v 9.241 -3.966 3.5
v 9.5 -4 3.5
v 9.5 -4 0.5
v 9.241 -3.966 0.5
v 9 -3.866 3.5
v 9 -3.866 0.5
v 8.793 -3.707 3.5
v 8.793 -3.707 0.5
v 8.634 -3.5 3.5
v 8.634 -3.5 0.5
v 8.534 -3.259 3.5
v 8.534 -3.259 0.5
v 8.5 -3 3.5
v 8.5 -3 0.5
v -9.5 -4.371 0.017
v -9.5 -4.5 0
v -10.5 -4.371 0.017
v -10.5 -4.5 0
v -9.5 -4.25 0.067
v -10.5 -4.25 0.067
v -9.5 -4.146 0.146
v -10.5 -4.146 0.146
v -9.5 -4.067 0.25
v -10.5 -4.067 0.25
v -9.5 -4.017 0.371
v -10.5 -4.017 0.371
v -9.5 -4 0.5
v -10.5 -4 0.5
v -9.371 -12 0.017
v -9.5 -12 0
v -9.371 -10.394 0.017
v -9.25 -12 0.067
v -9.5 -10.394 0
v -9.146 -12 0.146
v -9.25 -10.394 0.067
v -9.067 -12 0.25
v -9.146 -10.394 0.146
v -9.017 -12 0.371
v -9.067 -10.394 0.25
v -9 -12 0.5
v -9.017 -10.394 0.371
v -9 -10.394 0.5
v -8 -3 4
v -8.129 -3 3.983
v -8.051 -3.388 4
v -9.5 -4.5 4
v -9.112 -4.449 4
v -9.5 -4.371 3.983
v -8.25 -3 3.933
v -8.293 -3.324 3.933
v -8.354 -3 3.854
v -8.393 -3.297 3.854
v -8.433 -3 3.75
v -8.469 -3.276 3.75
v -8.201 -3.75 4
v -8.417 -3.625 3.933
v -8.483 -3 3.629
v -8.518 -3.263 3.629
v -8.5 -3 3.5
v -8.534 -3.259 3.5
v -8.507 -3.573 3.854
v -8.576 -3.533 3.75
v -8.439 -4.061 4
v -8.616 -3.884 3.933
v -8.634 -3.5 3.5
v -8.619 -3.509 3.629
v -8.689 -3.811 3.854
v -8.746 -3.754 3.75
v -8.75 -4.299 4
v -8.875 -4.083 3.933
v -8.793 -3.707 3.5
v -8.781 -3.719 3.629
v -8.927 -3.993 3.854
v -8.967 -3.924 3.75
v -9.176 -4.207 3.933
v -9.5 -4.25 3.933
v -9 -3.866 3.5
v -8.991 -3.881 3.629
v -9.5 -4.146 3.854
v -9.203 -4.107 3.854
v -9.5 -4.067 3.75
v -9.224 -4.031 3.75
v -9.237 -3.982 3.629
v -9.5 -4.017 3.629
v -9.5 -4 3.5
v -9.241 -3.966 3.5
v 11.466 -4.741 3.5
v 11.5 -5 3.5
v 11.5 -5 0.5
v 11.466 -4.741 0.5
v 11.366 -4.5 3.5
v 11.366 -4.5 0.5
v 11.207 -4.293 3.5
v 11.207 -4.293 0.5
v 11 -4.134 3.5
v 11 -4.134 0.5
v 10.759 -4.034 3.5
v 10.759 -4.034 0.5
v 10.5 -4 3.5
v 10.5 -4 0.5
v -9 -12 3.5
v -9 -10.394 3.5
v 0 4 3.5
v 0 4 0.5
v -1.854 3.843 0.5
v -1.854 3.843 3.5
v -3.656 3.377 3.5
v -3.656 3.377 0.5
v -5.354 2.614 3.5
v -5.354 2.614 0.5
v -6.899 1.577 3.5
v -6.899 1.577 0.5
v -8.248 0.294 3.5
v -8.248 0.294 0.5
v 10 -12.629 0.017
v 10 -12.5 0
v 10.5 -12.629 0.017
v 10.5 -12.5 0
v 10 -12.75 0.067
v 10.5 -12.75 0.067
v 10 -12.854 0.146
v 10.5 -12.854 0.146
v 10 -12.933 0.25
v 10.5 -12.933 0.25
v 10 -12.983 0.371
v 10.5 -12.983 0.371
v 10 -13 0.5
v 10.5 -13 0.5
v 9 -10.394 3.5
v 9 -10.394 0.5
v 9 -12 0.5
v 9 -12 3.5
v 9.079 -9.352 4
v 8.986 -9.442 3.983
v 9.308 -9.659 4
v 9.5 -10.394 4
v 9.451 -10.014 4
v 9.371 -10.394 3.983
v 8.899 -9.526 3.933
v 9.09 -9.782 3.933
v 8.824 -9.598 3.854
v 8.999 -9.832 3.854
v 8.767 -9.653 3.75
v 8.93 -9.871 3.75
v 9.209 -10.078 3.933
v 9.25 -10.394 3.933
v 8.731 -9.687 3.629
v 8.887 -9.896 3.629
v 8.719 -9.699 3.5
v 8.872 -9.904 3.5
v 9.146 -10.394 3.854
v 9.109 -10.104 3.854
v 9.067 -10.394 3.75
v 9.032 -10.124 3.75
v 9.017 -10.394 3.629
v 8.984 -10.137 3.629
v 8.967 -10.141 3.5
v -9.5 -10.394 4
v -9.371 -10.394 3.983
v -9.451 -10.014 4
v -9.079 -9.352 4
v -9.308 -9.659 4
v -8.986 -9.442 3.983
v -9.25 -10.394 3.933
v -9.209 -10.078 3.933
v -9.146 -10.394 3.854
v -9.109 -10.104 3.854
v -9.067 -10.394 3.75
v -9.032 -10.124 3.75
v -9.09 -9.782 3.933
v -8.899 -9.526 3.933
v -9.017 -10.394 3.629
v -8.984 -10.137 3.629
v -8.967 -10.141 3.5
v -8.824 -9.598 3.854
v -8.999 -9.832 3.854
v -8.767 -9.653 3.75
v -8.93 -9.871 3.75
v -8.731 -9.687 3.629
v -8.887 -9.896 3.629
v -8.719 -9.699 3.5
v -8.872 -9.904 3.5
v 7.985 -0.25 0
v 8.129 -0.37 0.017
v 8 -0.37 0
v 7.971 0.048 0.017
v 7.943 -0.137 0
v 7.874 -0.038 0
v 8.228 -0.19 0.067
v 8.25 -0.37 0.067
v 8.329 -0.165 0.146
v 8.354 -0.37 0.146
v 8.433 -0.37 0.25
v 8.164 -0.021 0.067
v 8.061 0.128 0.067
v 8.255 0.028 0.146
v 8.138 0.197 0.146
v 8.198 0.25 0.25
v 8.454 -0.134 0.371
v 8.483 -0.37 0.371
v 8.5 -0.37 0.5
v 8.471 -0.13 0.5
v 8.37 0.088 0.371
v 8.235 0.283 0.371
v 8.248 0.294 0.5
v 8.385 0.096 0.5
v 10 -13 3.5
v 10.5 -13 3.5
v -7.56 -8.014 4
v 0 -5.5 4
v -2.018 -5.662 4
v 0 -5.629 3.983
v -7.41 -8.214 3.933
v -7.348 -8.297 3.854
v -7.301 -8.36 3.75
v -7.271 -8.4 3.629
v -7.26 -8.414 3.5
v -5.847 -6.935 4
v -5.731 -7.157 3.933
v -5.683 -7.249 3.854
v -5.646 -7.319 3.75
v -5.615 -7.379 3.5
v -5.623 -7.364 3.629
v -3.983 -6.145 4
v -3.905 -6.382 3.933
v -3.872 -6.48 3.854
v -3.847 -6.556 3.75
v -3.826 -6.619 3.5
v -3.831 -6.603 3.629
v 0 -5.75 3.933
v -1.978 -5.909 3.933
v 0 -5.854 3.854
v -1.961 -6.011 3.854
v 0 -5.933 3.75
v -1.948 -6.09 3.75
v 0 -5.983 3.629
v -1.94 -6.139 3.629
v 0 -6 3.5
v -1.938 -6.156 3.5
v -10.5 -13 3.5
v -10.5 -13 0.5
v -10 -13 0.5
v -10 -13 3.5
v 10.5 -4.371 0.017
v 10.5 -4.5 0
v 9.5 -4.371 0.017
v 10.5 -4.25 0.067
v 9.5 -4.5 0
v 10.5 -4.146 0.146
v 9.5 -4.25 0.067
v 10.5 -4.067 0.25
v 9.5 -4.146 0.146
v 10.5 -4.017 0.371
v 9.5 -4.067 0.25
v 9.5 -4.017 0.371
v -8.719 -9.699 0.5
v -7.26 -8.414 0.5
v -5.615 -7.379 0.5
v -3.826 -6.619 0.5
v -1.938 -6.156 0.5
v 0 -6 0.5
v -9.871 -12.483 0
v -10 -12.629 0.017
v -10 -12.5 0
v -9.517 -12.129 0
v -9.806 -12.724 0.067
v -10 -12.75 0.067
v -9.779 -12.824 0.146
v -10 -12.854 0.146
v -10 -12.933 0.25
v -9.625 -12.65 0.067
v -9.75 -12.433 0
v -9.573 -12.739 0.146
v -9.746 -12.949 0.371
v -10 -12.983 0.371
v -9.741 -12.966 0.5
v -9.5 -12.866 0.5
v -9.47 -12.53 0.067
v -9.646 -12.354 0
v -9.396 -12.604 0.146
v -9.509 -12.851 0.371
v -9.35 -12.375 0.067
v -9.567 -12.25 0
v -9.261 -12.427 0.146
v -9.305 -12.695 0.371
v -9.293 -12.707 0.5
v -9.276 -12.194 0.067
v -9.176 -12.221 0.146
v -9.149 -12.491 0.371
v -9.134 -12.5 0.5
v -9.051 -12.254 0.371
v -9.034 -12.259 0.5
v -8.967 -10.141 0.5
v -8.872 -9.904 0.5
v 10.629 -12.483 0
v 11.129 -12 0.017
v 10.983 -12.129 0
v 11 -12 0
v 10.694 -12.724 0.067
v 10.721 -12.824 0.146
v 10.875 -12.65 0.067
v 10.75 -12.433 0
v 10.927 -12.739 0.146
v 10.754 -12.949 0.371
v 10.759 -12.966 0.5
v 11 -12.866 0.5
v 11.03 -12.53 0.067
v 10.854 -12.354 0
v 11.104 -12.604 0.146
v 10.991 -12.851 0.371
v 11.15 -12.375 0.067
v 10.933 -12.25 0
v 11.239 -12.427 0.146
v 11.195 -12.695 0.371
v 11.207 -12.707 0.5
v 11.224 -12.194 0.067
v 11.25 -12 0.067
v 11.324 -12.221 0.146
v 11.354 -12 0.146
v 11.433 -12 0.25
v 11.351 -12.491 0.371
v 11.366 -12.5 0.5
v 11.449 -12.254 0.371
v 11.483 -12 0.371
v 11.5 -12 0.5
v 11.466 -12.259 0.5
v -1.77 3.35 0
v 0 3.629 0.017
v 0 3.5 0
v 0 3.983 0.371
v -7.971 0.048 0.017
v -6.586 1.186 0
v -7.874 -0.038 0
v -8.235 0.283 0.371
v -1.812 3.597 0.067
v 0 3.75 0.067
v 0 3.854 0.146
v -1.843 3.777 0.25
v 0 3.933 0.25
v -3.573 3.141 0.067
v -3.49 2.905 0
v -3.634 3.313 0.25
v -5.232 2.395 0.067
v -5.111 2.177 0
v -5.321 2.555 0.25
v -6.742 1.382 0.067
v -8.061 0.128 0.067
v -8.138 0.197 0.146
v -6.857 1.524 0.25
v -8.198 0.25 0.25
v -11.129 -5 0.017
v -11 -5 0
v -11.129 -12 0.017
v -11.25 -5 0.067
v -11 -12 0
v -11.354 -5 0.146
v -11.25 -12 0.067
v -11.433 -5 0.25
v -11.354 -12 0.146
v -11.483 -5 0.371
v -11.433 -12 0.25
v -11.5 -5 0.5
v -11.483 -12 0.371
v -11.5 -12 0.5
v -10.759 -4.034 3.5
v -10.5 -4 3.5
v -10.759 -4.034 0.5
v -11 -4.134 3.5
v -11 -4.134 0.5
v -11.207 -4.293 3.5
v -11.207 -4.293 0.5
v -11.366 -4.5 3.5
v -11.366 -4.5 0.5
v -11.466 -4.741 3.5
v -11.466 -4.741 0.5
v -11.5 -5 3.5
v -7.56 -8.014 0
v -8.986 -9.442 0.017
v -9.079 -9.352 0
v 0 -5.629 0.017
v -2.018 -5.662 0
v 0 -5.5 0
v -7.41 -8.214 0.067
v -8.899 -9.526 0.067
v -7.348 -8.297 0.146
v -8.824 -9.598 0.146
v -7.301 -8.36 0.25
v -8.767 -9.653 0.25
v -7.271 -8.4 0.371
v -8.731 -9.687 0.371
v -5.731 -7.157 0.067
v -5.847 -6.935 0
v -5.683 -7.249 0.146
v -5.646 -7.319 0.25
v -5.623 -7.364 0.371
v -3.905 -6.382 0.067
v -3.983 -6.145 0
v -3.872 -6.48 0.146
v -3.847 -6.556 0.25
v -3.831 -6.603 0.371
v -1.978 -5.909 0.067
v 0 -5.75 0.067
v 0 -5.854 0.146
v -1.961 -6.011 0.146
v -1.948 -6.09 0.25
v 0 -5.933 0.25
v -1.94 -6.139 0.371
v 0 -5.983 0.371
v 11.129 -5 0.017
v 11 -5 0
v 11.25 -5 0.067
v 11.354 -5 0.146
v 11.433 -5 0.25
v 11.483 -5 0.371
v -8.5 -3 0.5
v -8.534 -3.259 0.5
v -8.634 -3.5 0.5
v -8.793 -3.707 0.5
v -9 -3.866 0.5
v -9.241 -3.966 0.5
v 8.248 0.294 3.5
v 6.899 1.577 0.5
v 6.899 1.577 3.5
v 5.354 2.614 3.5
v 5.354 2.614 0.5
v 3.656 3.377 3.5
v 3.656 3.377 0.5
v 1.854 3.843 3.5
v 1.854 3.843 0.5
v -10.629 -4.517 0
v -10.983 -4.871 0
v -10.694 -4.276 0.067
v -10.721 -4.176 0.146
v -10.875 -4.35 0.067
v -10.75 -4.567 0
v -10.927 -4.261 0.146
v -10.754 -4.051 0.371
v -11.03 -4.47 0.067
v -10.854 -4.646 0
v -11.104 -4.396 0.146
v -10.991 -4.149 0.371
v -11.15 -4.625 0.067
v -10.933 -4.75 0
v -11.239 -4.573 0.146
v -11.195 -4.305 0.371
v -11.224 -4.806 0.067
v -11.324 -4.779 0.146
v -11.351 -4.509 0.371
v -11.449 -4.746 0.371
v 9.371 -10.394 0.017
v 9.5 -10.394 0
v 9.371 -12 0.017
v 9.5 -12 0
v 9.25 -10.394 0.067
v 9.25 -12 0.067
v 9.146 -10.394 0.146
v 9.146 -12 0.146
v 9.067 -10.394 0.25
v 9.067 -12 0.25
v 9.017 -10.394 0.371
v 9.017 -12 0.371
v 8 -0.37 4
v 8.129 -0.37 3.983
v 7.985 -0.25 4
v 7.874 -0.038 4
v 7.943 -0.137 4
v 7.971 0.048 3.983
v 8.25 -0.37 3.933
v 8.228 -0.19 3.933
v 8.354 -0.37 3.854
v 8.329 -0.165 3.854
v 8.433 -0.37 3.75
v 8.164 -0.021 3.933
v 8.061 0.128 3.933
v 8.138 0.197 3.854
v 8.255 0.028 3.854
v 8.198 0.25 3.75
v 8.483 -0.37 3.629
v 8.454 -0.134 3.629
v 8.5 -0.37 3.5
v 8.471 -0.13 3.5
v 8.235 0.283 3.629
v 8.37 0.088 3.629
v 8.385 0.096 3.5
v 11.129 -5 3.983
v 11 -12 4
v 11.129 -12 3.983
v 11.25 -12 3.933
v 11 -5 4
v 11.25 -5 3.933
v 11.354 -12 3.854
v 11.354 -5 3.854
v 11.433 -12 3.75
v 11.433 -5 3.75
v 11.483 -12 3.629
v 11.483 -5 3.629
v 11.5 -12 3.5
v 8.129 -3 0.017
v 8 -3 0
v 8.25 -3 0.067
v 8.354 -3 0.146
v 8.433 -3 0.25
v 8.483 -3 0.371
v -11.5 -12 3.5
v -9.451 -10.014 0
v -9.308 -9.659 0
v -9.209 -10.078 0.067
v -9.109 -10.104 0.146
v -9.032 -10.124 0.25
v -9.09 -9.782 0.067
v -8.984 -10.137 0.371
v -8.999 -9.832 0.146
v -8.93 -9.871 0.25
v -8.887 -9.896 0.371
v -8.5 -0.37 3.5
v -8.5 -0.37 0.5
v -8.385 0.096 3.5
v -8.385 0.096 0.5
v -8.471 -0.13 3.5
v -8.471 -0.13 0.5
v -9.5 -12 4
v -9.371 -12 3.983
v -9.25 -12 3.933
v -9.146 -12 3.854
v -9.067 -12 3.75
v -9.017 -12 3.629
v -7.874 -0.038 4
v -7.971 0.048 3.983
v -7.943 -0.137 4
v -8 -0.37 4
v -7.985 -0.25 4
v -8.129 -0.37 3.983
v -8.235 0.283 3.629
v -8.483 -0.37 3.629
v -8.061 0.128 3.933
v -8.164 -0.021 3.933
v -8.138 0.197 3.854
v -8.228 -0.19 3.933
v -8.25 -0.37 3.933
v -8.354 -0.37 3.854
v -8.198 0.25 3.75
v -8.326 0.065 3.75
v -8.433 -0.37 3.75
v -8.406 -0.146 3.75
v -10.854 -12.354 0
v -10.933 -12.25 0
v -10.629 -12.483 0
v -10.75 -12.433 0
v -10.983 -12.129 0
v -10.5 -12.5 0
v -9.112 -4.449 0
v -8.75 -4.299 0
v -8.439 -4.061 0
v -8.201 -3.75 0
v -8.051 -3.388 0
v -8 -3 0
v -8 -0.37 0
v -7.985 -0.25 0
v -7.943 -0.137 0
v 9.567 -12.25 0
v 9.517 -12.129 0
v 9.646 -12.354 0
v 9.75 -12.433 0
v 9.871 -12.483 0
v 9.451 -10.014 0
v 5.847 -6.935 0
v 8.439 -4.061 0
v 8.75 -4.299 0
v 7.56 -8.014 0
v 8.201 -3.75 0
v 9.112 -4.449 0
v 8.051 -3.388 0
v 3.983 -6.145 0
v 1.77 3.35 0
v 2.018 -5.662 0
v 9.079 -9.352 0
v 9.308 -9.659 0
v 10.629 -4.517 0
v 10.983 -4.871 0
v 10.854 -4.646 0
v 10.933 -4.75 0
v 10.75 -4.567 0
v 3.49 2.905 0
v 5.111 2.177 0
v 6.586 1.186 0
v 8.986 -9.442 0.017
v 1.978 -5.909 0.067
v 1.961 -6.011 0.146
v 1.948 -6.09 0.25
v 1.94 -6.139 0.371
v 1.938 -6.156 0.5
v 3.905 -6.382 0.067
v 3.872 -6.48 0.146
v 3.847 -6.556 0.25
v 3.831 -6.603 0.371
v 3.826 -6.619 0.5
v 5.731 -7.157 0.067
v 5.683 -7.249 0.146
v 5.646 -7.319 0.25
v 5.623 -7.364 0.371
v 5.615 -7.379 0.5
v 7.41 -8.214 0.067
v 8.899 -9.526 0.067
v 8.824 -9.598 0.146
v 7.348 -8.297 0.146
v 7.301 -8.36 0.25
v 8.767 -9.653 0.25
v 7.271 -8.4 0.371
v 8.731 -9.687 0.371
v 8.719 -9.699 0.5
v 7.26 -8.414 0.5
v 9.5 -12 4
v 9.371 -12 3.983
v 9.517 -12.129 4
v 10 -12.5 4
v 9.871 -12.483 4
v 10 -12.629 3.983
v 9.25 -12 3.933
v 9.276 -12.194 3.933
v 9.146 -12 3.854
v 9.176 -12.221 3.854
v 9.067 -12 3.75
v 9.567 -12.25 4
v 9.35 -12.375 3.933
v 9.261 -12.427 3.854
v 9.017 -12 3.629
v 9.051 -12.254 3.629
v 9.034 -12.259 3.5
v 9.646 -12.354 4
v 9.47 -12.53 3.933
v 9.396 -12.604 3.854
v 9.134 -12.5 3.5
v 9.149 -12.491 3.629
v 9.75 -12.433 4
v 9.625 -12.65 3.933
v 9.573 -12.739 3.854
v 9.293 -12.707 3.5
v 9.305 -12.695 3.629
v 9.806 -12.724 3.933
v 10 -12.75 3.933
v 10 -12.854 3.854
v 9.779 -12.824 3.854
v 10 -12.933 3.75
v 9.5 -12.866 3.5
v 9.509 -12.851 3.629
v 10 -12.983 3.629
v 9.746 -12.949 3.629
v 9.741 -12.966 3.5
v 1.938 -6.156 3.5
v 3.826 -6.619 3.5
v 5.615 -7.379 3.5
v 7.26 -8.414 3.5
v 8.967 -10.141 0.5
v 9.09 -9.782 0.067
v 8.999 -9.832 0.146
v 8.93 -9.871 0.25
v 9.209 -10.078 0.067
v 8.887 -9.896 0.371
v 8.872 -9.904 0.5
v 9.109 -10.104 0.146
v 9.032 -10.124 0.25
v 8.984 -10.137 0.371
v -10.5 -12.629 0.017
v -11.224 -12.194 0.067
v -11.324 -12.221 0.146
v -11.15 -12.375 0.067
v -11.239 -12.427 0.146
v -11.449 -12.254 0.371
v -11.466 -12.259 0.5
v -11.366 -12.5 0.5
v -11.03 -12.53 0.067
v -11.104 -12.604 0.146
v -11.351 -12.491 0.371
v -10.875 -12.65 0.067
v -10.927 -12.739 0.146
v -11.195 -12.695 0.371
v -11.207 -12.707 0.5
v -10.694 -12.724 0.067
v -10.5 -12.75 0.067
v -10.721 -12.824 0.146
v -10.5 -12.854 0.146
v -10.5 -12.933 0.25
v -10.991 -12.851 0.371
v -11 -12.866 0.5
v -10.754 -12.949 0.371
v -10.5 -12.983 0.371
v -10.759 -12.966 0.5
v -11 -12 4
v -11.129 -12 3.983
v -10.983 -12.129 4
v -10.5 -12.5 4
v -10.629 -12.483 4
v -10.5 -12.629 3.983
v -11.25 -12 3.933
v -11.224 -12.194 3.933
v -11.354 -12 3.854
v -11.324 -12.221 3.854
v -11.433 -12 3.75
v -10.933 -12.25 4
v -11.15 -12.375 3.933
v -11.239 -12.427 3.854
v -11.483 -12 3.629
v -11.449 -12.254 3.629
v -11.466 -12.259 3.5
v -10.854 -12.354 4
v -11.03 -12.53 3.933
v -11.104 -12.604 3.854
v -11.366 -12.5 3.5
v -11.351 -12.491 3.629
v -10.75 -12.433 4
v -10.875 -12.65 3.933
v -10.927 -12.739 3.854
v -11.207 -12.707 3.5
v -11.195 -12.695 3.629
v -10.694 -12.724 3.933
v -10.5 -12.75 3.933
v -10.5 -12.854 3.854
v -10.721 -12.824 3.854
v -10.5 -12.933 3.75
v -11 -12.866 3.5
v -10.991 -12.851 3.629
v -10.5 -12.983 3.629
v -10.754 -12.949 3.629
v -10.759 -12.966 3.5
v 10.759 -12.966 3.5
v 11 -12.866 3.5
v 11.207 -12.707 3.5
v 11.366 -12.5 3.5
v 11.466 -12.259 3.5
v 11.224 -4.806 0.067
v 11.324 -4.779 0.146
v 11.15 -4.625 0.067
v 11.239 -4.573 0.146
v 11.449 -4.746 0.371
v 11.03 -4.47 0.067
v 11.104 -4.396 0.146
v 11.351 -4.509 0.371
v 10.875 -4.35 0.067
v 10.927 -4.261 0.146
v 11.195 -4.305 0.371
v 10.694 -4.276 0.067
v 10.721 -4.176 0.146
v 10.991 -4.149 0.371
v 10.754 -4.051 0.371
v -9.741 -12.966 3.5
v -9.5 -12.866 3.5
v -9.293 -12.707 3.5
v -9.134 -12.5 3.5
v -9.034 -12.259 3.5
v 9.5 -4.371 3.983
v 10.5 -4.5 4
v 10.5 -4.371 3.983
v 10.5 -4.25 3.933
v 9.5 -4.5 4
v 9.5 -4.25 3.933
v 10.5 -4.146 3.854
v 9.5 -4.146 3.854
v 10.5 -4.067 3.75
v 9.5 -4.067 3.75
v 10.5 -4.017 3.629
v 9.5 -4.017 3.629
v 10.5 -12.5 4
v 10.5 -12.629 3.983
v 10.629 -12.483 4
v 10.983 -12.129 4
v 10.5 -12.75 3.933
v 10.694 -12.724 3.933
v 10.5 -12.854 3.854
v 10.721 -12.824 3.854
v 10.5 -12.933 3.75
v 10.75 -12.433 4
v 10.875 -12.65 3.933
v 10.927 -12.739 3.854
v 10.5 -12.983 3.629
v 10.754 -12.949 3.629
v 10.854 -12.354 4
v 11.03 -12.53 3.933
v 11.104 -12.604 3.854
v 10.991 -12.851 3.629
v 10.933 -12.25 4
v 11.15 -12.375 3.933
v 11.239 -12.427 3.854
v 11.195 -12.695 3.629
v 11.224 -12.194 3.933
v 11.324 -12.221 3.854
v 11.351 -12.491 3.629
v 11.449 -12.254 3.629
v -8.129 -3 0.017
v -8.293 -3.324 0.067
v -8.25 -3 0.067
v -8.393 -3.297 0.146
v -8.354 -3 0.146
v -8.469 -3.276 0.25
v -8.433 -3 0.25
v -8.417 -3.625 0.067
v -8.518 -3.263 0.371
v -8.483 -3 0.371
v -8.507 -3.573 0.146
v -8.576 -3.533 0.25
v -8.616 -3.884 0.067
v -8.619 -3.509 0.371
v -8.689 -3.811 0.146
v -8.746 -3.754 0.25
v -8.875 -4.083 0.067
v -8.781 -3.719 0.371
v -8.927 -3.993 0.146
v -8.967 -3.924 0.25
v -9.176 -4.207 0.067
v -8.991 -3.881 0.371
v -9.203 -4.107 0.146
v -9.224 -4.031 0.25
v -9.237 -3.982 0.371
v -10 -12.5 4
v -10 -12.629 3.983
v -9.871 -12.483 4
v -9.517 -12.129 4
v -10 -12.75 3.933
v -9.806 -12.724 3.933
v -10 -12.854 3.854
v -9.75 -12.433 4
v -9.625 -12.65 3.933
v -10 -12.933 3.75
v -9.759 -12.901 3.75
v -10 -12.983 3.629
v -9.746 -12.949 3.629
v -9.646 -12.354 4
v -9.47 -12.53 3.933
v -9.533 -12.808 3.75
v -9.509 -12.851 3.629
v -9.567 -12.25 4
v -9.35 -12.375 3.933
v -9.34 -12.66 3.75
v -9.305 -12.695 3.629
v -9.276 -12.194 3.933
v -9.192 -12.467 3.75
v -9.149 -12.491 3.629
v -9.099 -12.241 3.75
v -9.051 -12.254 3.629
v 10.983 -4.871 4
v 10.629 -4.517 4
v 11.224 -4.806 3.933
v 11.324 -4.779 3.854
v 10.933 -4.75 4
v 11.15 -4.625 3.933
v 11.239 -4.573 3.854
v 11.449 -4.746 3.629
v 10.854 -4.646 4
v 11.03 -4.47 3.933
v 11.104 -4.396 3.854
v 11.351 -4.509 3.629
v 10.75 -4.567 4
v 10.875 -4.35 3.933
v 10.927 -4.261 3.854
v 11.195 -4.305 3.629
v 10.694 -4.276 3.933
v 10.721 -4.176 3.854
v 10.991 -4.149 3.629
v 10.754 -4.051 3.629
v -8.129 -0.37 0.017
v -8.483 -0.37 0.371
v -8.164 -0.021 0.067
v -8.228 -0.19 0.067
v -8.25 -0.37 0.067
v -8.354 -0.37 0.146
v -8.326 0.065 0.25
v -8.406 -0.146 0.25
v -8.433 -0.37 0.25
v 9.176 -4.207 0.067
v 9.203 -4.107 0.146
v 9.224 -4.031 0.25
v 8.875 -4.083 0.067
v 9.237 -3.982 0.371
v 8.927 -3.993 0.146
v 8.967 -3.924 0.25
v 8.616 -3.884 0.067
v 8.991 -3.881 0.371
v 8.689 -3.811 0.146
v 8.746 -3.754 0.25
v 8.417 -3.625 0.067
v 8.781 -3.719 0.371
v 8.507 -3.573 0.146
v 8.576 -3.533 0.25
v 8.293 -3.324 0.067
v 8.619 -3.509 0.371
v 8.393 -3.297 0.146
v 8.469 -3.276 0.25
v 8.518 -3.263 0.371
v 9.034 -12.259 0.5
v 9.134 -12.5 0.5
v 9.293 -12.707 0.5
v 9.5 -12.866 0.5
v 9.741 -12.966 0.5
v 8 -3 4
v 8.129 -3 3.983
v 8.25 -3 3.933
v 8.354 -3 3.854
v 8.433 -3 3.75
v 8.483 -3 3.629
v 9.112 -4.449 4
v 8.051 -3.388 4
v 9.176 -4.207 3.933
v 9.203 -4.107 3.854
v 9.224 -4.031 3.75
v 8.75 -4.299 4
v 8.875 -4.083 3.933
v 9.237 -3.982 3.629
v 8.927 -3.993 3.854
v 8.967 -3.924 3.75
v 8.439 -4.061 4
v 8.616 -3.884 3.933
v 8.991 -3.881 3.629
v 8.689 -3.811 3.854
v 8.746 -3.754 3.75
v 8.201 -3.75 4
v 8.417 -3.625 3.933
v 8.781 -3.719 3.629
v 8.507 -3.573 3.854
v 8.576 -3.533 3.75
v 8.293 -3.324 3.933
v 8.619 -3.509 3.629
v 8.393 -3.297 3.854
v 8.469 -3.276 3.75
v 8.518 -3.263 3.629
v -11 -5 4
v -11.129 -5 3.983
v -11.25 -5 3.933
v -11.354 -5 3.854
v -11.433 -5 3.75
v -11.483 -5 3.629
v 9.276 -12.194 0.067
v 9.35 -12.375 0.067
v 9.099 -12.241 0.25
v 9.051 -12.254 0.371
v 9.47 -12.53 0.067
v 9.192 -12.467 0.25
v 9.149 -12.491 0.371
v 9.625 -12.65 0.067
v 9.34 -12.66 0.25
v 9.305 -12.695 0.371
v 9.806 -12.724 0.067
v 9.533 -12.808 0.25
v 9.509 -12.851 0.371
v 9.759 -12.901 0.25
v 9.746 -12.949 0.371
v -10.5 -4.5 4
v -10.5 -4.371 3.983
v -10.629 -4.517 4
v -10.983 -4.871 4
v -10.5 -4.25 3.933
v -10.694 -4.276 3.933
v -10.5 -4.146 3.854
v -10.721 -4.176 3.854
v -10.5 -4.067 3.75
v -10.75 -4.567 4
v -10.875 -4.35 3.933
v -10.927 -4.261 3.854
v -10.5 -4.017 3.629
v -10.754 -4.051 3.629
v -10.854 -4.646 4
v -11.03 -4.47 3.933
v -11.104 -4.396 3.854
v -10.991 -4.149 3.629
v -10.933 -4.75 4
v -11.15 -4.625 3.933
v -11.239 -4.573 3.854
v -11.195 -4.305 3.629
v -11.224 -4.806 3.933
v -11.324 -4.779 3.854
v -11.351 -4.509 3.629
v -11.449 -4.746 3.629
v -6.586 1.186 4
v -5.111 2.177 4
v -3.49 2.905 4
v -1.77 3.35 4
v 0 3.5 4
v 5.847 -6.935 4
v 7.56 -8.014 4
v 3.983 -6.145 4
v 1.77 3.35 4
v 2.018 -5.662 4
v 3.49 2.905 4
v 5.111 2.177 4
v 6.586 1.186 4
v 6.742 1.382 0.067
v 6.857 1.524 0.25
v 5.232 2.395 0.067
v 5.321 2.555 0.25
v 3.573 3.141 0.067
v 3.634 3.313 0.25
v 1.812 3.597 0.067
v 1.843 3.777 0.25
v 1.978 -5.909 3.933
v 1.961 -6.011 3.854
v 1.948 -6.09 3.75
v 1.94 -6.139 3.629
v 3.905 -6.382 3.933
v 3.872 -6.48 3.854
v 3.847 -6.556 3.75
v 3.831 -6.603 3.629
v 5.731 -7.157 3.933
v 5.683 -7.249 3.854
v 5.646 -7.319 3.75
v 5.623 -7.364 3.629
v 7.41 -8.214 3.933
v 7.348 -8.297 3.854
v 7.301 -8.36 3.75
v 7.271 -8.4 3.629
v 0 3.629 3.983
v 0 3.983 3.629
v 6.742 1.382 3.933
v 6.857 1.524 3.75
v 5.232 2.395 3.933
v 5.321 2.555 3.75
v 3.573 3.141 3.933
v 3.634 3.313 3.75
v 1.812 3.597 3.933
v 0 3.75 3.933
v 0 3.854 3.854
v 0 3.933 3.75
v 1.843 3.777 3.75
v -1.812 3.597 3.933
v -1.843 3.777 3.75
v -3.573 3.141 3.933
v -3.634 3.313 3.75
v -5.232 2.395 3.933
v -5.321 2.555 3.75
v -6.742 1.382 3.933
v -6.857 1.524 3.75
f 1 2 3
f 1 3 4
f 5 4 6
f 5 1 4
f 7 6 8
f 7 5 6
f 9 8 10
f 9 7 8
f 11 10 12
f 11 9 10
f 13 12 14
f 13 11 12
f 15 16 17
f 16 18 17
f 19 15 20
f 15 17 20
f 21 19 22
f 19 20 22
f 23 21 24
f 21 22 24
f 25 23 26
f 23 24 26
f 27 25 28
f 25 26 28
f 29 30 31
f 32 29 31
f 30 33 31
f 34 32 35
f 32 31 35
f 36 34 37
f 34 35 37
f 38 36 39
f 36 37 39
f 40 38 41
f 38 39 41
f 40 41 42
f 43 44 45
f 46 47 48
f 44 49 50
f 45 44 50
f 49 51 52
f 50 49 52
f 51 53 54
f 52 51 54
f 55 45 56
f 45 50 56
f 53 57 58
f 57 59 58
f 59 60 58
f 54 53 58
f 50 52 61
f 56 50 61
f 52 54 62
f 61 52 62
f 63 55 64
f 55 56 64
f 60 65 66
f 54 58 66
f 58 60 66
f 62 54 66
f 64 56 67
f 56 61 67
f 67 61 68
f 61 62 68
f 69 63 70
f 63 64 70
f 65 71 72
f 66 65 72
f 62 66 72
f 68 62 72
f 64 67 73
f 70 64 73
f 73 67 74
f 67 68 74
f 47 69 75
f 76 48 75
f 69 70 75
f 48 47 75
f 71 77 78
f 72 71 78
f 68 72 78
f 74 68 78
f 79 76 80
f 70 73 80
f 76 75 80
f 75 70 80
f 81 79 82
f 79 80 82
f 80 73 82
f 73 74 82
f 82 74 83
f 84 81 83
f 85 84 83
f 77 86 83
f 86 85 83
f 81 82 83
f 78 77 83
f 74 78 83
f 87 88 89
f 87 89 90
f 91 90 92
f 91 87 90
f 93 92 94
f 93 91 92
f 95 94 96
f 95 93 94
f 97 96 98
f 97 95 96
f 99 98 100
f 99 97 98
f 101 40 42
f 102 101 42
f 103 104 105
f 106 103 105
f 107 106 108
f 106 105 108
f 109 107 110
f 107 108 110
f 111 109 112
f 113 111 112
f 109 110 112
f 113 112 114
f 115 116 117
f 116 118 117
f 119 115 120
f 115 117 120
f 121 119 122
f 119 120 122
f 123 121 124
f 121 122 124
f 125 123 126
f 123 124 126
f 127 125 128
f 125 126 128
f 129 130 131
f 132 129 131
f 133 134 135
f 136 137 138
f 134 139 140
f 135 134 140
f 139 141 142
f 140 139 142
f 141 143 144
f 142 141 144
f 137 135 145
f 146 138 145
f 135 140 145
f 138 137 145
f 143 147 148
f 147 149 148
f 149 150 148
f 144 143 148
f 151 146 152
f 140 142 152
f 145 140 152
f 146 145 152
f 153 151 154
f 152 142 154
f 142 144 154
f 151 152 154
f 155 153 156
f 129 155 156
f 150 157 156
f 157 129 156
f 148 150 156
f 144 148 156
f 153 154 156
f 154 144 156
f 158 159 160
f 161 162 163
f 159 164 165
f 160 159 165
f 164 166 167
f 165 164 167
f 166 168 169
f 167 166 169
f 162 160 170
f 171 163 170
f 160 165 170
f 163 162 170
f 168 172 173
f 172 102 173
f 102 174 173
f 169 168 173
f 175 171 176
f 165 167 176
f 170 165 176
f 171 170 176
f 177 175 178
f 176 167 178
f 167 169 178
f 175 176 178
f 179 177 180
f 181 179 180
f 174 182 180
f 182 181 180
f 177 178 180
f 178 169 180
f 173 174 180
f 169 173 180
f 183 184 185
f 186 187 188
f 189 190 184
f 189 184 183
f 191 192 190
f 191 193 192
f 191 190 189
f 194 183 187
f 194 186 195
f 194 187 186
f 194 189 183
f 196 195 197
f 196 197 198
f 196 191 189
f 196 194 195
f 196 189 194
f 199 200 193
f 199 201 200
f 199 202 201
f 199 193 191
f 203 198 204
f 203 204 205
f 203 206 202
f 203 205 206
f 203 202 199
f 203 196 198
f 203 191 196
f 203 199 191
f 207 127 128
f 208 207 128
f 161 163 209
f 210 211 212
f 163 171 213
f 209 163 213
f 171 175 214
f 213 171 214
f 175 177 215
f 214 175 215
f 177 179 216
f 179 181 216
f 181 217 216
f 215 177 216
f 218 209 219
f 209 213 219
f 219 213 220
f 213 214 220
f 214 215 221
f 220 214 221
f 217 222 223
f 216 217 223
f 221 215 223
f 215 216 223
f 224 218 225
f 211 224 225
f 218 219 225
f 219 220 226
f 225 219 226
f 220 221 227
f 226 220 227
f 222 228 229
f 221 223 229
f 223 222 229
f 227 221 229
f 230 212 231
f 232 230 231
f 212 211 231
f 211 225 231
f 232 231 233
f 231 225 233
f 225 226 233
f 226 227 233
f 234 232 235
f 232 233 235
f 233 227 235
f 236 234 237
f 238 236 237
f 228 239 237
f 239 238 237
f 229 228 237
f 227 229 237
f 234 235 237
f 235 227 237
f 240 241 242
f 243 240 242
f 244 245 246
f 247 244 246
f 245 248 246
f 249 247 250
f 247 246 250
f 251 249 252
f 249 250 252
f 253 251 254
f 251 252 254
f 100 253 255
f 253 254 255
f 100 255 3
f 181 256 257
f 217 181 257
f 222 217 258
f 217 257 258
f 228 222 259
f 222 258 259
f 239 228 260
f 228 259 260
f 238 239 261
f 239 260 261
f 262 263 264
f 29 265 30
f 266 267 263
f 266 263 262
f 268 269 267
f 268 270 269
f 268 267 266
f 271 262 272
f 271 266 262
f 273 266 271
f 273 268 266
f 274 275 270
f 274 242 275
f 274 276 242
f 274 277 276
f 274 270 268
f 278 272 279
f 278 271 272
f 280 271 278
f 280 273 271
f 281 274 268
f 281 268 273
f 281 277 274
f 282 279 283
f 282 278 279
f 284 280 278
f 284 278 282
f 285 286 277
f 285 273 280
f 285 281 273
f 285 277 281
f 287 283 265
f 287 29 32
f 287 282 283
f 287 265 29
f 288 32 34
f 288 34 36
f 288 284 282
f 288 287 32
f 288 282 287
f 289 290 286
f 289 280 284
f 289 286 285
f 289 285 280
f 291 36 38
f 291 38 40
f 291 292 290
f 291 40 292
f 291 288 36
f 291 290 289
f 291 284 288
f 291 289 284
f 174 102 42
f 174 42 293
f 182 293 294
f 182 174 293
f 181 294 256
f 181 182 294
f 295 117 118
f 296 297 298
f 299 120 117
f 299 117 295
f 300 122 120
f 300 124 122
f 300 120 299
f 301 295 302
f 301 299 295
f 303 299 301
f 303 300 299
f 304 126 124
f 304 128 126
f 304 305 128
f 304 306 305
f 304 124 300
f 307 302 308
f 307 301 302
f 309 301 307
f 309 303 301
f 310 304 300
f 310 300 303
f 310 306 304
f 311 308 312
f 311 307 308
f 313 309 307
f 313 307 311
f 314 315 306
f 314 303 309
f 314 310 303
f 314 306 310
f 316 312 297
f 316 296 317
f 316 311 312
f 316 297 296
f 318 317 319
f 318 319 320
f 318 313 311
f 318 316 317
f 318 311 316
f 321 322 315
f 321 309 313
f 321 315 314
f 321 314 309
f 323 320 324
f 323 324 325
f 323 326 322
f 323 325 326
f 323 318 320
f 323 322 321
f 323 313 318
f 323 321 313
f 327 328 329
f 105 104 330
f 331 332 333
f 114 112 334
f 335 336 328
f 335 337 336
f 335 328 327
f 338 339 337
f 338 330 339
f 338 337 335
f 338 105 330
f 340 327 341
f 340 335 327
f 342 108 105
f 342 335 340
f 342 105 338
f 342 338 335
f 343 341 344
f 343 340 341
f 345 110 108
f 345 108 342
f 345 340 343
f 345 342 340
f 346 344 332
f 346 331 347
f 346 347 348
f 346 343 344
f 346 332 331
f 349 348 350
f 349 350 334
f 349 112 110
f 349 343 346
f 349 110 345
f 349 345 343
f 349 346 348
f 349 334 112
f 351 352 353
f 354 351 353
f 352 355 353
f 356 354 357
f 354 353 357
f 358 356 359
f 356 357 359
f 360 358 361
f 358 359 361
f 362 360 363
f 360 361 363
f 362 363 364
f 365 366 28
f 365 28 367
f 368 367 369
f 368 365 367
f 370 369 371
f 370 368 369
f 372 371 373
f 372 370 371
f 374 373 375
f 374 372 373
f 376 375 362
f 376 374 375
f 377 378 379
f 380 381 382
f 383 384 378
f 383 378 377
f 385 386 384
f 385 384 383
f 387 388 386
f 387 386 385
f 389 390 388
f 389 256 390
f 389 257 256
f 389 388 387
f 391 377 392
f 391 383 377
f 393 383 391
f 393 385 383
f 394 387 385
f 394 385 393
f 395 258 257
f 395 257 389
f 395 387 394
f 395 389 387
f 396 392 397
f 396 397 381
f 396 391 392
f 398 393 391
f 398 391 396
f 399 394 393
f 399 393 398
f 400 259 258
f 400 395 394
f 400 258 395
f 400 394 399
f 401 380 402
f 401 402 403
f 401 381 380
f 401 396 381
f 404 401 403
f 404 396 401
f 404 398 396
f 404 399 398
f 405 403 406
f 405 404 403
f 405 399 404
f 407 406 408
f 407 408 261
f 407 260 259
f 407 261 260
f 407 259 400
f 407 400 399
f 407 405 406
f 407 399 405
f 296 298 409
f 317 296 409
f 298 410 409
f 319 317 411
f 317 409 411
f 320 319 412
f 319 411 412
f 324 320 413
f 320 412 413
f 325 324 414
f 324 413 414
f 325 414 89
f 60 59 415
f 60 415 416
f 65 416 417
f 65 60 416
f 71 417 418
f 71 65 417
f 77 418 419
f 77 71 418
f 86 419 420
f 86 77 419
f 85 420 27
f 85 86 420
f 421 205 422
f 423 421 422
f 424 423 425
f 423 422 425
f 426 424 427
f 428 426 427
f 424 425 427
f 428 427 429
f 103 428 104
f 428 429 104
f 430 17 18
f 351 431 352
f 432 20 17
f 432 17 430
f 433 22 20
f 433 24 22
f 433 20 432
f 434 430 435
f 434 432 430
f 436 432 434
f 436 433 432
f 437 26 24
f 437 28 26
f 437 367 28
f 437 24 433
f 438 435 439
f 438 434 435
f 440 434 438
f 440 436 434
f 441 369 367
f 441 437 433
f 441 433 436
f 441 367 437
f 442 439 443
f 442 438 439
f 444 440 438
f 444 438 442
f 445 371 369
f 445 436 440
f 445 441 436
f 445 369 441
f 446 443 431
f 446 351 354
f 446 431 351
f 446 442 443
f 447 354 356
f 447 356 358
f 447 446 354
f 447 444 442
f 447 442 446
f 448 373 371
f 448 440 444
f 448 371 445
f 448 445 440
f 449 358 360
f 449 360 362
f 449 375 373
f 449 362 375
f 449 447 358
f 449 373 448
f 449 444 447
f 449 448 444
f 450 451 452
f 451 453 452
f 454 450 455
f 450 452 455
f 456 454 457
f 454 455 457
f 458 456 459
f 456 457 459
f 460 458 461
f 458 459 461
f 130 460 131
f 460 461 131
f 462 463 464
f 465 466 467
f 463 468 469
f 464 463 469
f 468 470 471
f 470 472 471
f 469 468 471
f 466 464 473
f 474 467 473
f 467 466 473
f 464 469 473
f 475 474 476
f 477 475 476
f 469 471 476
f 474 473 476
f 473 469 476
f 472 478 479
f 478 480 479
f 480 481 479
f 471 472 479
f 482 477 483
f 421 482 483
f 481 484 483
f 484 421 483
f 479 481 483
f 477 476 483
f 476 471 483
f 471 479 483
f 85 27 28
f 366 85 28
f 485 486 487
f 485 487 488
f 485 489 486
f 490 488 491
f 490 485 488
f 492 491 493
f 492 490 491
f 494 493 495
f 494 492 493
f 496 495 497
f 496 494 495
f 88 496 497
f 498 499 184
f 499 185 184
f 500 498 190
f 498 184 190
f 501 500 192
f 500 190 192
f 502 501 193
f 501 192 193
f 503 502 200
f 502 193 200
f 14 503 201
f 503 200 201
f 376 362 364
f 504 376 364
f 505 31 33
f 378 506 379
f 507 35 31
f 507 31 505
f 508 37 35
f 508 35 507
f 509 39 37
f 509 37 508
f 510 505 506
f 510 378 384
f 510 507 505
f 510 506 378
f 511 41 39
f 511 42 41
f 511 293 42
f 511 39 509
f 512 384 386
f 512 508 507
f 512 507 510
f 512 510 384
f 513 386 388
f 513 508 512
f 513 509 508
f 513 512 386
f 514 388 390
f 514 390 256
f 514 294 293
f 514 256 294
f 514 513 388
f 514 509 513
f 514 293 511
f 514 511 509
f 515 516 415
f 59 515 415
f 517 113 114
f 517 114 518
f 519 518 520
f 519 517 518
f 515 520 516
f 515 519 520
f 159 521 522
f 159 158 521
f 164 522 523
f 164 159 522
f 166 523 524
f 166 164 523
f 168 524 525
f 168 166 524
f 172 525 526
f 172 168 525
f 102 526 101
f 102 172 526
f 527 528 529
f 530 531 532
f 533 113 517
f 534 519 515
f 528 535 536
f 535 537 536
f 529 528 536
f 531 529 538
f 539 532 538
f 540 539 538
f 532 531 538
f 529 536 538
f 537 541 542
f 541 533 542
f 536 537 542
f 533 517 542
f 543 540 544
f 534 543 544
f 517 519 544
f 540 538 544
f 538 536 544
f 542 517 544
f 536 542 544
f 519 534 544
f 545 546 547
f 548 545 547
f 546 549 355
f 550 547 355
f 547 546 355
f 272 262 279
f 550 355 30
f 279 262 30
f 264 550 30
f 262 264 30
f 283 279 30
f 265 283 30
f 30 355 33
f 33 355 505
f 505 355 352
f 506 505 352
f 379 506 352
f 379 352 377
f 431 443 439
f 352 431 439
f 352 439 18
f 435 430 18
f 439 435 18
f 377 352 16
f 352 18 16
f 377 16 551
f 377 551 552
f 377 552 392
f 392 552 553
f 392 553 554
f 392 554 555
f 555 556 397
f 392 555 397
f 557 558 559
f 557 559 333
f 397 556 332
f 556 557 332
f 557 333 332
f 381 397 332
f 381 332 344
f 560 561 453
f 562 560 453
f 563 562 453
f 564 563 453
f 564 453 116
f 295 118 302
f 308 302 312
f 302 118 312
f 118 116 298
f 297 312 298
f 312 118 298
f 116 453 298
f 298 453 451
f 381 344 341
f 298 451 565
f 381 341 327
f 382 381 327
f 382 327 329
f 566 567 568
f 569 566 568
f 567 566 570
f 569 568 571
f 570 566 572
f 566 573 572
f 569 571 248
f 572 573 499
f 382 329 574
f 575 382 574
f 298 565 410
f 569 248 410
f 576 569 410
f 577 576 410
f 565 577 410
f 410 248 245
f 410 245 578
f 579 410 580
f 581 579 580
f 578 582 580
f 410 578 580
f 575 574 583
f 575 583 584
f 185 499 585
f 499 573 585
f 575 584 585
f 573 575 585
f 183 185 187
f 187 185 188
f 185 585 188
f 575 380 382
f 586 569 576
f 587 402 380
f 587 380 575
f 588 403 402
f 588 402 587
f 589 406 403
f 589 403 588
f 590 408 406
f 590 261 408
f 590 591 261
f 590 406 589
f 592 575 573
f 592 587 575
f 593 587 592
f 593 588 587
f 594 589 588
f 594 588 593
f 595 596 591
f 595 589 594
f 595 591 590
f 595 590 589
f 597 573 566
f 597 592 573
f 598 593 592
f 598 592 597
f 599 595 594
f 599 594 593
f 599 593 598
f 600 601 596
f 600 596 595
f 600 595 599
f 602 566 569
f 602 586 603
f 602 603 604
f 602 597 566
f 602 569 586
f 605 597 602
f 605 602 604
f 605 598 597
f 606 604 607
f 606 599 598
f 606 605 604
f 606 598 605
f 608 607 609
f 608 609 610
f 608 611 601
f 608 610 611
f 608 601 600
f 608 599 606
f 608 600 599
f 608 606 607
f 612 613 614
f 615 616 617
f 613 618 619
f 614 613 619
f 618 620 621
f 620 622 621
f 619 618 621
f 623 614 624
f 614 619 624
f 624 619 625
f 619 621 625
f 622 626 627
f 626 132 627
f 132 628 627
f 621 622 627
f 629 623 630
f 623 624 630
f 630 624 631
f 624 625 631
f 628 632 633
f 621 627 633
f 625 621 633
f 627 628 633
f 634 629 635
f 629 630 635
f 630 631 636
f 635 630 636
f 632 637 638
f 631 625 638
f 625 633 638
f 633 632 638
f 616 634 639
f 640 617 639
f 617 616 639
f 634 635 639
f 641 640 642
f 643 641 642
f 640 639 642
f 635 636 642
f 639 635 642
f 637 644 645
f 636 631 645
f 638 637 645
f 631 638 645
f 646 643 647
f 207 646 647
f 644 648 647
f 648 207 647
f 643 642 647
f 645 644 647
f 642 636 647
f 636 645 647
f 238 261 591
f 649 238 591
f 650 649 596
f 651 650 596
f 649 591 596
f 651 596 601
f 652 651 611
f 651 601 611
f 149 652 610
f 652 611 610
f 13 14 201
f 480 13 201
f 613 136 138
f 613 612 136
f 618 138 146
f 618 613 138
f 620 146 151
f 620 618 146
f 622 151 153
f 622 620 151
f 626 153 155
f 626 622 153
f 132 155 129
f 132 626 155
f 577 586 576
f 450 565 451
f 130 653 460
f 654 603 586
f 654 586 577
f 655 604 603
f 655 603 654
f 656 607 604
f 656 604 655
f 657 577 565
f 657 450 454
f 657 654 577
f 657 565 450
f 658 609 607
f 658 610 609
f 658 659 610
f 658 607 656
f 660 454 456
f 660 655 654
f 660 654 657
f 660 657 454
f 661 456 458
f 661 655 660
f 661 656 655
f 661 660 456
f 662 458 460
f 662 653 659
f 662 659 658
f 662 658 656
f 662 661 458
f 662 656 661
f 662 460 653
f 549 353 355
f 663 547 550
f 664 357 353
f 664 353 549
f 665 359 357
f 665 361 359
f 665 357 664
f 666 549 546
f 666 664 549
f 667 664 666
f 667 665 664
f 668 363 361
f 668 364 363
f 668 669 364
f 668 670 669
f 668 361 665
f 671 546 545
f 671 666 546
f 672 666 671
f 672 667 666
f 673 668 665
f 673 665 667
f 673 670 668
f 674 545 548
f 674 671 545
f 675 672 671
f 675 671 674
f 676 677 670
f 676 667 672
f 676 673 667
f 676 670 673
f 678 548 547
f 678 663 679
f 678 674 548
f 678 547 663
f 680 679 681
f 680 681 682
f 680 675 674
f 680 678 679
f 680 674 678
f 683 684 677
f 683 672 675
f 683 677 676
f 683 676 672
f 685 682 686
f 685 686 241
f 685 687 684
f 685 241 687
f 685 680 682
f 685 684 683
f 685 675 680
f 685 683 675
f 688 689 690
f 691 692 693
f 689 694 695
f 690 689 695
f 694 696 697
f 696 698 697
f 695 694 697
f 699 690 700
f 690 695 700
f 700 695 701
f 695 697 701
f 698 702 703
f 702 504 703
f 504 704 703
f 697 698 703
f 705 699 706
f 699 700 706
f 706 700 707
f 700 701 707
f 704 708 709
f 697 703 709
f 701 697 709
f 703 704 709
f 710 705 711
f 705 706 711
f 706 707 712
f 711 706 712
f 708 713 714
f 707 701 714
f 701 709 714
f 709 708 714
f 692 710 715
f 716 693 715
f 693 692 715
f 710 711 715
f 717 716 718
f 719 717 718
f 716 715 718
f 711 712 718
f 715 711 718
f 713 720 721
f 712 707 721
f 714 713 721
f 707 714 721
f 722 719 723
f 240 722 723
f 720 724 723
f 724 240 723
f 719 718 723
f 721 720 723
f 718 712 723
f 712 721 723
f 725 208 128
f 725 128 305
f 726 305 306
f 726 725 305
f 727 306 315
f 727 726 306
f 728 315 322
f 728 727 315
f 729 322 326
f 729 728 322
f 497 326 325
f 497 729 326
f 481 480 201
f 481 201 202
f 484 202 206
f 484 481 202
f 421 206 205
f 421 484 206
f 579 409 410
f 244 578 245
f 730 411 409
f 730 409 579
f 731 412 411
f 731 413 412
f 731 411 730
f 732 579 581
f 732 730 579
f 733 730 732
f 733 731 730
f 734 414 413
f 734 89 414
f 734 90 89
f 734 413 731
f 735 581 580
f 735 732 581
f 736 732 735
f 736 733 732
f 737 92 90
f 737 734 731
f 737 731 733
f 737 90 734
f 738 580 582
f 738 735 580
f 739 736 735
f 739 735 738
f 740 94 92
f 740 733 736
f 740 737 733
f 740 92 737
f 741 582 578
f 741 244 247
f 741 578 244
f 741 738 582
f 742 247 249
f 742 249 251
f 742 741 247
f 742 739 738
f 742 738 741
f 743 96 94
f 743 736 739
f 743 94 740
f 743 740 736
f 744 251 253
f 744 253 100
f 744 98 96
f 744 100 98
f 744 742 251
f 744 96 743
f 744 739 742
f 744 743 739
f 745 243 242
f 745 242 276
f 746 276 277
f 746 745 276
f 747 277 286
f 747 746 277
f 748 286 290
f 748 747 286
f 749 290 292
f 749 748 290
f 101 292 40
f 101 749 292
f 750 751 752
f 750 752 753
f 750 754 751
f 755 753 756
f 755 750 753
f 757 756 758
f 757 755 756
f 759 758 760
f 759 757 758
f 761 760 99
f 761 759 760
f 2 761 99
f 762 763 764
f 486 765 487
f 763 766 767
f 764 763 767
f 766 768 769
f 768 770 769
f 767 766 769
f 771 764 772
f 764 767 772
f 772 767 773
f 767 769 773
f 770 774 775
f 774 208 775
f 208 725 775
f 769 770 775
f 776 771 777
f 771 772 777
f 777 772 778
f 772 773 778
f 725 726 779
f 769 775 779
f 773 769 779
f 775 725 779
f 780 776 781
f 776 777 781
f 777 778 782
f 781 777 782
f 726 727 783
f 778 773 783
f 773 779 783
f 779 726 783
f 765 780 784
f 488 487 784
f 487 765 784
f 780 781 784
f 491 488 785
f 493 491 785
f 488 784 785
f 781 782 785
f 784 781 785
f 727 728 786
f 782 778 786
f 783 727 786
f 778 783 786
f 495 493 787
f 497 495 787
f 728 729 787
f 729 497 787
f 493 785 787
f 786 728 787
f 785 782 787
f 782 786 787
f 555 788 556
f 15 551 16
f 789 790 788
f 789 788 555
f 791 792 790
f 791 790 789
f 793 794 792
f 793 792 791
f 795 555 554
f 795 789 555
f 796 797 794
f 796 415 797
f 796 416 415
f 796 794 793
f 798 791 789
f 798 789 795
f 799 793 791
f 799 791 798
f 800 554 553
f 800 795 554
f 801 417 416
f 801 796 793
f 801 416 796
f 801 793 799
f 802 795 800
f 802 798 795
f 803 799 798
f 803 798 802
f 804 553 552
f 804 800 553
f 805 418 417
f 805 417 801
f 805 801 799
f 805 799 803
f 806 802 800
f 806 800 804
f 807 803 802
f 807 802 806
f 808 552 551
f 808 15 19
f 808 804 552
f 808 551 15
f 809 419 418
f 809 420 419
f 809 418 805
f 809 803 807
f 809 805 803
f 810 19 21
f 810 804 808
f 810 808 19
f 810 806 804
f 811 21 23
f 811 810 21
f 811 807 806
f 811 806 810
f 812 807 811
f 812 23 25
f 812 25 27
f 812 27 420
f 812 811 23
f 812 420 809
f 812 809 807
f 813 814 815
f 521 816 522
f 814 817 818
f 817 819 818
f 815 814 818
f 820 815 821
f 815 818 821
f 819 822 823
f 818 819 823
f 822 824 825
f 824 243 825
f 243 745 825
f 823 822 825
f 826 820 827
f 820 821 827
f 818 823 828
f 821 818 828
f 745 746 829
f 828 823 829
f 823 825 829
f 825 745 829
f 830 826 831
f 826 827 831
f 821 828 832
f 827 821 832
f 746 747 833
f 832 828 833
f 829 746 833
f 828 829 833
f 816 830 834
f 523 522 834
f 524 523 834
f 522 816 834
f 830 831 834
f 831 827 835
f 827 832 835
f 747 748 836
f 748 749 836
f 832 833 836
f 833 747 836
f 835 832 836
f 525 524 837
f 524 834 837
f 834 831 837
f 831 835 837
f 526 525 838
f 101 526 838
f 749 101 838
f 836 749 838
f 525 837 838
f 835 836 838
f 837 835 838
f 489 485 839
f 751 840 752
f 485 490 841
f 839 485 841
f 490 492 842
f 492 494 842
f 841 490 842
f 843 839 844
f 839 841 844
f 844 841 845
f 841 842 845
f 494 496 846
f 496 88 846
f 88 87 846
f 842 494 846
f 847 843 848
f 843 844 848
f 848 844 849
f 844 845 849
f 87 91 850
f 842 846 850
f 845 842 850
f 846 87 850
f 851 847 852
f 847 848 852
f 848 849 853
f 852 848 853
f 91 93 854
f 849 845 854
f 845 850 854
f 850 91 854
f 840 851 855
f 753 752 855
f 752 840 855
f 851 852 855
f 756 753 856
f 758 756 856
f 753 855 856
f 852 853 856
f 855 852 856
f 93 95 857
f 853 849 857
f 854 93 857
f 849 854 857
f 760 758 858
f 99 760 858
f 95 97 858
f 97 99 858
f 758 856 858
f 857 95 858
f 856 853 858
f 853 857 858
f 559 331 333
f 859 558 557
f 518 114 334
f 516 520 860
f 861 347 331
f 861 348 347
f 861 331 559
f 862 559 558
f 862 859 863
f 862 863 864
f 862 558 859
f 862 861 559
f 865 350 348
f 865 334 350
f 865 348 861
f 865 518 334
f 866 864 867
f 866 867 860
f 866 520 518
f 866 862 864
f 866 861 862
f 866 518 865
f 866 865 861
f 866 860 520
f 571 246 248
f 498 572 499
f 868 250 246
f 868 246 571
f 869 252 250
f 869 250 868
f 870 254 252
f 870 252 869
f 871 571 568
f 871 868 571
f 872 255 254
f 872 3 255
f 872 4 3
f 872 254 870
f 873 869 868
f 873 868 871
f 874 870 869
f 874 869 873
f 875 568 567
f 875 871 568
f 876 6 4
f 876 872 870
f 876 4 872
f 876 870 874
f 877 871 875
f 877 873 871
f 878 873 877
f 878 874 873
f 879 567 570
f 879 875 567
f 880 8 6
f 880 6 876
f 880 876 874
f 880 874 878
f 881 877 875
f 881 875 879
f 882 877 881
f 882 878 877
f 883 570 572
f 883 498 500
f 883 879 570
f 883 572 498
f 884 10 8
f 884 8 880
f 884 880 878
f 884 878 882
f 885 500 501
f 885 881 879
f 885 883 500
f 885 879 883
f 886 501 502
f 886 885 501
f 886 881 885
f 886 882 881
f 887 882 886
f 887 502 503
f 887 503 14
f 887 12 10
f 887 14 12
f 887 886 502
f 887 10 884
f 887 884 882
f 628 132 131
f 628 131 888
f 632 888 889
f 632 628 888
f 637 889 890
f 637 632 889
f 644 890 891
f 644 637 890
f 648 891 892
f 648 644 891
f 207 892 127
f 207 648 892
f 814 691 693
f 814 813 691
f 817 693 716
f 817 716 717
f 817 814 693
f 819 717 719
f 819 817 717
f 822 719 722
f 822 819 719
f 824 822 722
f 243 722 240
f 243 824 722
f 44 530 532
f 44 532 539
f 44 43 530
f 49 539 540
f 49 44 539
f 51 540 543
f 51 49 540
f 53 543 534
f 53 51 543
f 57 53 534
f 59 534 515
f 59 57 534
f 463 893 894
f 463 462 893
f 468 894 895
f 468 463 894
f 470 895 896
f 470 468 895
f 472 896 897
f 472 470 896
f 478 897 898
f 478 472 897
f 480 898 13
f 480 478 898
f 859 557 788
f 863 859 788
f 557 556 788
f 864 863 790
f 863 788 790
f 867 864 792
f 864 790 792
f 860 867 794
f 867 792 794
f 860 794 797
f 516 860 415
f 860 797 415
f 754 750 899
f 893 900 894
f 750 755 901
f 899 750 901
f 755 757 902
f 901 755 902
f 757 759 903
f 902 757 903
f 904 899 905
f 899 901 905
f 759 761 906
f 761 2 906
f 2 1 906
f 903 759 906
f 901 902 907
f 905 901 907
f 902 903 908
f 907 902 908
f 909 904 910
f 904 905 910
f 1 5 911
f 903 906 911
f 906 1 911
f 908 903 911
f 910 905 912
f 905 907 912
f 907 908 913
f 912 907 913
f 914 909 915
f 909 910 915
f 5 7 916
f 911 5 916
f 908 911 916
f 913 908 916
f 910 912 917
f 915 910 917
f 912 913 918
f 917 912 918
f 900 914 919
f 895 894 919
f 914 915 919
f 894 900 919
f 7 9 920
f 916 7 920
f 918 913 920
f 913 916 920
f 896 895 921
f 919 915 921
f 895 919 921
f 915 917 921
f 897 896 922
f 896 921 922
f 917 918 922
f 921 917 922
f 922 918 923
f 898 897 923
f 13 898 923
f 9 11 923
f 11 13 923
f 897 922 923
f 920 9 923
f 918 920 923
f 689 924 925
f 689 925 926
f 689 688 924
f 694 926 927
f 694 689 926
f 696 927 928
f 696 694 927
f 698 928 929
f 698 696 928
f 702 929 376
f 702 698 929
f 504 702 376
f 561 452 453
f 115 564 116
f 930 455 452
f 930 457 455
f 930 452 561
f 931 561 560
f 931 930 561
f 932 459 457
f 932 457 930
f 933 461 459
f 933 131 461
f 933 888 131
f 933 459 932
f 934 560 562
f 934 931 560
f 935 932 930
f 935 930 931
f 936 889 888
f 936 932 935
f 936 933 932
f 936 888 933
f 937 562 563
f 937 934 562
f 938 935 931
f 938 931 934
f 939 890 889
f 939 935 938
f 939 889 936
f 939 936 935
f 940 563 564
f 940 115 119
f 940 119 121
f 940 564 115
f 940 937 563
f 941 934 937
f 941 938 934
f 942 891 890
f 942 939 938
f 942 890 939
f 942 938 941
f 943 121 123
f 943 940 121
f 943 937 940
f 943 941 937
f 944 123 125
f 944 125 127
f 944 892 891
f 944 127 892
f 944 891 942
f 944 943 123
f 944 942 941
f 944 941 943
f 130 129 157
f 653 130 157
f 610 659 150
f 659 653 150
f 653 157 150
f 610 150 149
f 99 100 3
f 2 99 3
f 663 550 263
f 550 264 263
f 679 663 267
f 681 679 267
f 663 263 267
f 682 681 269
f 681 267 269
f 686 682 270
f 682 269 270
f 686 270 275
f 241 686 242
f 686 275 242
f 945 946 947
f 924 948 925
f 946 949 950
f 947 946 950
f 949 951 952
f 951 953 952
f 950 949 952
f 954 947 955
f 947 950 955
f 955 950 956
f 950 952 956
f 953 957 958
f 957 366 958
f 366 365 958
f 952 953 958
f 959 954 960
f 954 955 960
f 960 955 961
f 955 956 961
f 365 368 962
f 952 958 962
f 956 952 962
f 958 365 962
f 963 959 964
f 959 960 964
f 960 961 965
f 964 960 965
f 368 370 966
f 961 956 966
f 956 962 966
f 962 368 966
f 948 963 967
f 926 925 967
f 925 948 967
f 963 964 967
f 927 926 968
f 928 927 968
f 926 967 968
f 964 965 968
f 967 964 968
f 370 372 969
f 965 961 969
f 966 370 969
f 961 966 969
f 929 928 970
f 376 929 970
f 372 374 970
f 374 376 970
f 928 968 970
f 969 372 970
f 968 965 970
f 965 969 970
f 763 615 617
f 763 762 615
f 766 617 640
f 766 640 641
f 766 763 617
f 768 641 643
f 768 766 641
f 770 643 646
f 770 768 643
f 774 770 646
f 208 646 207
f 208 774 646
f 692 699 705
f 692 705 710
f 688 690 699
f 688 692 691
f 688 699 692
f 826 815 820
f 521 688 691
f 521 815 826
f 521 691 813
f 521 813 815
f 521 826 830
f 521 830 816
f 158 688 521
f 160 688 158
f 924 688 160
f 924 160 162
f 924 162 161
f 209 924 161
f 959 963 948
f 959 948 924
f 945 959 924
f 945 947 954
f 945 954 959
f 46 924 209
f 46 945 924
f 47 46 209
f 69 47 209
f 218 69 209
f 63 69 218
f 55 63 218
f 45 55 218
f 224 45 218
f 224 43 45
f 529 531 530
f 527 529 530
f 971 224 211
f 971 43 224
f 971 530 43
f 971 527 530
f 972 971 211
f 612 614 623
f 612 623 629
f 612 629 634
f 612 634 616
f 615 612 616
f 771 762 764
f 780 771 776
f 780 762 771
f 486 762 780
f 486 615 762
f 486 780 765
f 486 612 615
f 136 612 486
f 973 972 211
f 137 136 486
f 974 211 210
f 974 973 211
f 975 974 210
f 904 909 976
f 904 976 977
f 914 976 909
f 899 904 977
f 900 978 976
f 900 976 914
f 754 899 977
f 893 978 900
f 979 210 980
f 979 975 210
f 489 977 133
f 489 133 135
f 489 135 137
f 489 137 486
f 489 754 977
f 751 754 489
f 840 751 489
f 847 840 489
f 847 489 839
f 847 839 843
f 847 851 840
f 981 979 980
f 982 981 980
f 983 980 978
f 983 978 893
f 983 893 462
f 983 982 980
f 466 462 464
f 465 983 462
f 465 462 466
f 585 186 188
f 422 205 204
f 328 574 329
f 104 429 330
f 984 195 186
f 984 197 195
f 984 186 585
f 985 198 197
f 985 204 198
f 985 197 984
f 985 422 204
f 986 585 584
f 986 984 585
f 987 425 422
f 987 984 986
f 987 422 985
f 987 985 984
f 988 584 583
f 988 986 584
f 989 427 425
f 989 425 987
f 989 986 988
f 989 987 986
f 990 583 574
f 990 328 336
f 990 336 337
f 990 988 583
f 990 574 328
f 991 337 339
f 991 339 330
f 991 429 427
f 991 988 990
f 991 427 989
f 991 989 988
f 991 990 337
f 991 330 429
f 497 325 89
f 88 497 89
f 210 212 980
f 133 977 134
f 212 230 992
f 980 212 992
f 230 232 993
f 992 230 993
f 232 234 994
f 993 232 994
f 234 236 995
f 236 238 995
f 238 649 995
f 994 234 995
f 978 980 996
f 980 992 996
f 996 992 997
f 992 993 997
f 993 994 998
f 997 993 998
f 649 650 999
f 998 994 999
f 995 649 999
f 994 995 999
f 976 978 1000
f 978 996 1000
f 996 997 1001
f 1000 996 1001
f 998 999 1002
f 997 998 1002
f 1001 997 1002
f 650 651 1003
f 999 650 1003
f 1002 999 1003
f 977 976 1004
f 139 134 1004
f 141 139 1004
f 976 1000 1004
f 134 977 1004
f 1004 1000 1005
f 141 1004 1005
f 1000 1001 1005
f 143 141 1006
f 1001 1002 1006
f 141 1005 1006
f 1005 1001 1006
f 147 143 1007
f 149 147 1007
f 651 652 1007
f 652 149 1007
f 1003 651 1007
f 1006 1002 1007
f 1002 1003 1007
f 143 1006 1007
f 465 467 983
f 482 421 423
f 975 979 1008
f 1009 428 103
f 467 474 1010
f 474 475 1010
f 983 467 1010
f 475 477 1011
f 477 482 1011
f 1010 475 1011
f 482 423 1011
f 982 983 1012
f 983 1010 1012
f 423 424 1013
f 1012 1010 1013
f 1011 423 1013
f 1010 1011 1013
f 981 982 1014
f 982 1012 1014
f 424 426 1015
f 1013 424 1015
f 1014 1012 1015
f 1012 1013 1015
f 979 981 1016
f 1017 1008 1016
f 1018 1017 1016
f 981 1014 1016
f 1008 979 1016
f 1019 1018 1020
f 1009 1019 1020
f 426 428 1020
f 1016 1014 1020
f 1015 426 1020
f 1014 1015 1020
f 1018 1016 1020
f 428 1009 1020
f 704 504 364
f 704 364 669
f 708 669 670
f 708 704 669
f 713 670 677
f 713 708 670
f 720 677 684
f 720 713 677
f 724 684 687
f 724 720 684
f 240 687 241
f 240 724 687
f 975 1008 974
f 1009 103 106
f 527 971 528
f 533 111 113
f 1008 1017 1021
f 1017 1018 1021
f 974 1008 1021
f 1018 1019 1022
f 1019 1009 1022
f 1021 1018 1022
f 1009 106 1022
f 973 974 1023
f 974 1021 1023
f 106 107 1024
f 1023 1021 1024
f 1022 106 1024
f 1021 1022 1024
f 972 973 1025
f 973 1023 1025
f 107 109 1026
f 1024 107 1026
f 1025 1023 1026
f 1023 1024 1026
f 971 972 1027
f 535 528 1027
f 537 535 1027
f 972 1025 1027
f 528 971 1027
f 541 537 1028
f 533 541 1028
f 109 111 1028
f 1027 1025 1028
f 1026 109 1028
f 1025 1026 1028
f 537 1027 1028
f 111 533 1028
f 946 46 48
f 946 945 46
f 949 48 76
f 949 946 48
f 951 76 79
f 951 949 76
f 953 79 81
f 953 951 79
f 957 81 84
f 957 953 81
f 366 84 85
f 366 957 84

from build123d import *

# Parameters (mm, degrees)
F1_DEPTH = 4
F2_R     = 1
F3_R     = 0.5


# Not quite as in the source:
# - a feature names something its author has since deleted; it is built from what else it names


with BuildPart() as f1:
    # F0 (on Top) → F1 (new body)
    with BuildSketch(Plane.XY):
        with BuildLine():
            Line((9, -10), (9, -13))
            Line((9, -13), (11.5, -13))
            Line((11.5, -13), (11.5, -4))
            Line((11.5, -4), (8.5, -4))
            Line((8.5, -4), (8.5, 0))
            ThreePointArc((8.5, 0), (4.697073557, 2.9500313087), (0, 4))
            ThreePointArc((0, 4), (-4.697073557, 2.9500313087), (-8.5, 0))
            Line((-8.5, 0), (-8.5, -4))
            Line((-8.5, -4), (-11.5, -4))
            Line((-11.5, -4), (-11.5, -13))
            Line((-11.5, -13), (-9, -13))
            Line((-9, -13), (-9, -10))
            ThreePointArc((-9, -10), (-4.9244289009, -7.045034973), (0, -6))
            ThreePointArc((0, -6), (4.9244289009, -7.045034973), (9, -10))
        make_face()
    extrude(amount=F1_DEPTH)

    # F2
    f2_edges = [f1.edges().sort_by_distance(p)[0] for p in [
        (-9, -13, 2),
        (9, -13, 2),
        (-11.5, -4, 2),
        (-8.5, -4, 2),
        (8.5, -4, 2),
        (11.5, -4, 2),
        (9, -10, 2),
        (-9, -10, 2),
        (-11.5, -13, 2),
        (-8.5, 0, 2),
        (8.5, 0, 2),
        (11.5, -13, 2),
    ]]
    fillet(f2_edges, radius=F2_R)

    # F3
    f3_edges = [f1.edges().sort_by_distance(p)[0] for p in [
        (-9, -11.197088, 4),
        (0, -6, 4),
        (8.927119, -10.019411, 4),
        (-8.927119, -10.019411, 4),
        (9, -11.197088, 4),
        (9.292893, -12.707107, 4),
        (-9.292893, -12.707107, 4),
        (10.25, -13, 4),
        (-10.25, -13, 4),
        (11.207107, -12.707107, 4),
        (-11.207107, -12.707107, 4),
        (11.5, -8.5, 4),
        (-11.5, -8.5, 4),
        (11.207107, -4.292893, 4),
        (-11.207107, -4.292893, 4),
        (10, -4, 4),
        (-10, -4, 4),
        (8.792893, -3.707107, 4),
        (-8.792893, -3.707107, 4),
        (8.5, -1.68486, 4),
        (-8.5, -1.68486, 4),
        (8.43479, -0.014519, 4),
        (-8.43479, -0.014519, 4),
        (0, 4, 4),
        (10.25, -13, 0),
        (9, -11.197088, 0),
        (-9, -11.197088, 0),
        (-10.25, -13, 0),
        (0, -6, 0),
        (8.927119, -10.019411, 0),
        (9.292893, -12.707107, 0),
        (-8.927119, -10.019411, 0),
        (11.207107, -12.707107, 0),
        (11.5, -8.5, 0),
        (-9.292893, -12.707107, 0),
        (11.207107, -4.292893, 0),
        (10, -4, 0),
        (-11.207107, -12.707107, 0),
        (8.792893, -3.707107, 0),
        (-11.5, -8.5, 0),
        (8.5, -1.68486, 0),
        (-11.207107, -4.292893, 0),
        (8.43479, -0.014519, 0),
        (-10, -4, 0),
        (0, 4, 0),
        (-8.792893, -3.707107, 0),
        (-8.43479, -0.014519, 0),
        (-8.5, -1.68486, 0),
    ]]
    fillet(f3_edges, radius=F3_R)


solid = f1.part
